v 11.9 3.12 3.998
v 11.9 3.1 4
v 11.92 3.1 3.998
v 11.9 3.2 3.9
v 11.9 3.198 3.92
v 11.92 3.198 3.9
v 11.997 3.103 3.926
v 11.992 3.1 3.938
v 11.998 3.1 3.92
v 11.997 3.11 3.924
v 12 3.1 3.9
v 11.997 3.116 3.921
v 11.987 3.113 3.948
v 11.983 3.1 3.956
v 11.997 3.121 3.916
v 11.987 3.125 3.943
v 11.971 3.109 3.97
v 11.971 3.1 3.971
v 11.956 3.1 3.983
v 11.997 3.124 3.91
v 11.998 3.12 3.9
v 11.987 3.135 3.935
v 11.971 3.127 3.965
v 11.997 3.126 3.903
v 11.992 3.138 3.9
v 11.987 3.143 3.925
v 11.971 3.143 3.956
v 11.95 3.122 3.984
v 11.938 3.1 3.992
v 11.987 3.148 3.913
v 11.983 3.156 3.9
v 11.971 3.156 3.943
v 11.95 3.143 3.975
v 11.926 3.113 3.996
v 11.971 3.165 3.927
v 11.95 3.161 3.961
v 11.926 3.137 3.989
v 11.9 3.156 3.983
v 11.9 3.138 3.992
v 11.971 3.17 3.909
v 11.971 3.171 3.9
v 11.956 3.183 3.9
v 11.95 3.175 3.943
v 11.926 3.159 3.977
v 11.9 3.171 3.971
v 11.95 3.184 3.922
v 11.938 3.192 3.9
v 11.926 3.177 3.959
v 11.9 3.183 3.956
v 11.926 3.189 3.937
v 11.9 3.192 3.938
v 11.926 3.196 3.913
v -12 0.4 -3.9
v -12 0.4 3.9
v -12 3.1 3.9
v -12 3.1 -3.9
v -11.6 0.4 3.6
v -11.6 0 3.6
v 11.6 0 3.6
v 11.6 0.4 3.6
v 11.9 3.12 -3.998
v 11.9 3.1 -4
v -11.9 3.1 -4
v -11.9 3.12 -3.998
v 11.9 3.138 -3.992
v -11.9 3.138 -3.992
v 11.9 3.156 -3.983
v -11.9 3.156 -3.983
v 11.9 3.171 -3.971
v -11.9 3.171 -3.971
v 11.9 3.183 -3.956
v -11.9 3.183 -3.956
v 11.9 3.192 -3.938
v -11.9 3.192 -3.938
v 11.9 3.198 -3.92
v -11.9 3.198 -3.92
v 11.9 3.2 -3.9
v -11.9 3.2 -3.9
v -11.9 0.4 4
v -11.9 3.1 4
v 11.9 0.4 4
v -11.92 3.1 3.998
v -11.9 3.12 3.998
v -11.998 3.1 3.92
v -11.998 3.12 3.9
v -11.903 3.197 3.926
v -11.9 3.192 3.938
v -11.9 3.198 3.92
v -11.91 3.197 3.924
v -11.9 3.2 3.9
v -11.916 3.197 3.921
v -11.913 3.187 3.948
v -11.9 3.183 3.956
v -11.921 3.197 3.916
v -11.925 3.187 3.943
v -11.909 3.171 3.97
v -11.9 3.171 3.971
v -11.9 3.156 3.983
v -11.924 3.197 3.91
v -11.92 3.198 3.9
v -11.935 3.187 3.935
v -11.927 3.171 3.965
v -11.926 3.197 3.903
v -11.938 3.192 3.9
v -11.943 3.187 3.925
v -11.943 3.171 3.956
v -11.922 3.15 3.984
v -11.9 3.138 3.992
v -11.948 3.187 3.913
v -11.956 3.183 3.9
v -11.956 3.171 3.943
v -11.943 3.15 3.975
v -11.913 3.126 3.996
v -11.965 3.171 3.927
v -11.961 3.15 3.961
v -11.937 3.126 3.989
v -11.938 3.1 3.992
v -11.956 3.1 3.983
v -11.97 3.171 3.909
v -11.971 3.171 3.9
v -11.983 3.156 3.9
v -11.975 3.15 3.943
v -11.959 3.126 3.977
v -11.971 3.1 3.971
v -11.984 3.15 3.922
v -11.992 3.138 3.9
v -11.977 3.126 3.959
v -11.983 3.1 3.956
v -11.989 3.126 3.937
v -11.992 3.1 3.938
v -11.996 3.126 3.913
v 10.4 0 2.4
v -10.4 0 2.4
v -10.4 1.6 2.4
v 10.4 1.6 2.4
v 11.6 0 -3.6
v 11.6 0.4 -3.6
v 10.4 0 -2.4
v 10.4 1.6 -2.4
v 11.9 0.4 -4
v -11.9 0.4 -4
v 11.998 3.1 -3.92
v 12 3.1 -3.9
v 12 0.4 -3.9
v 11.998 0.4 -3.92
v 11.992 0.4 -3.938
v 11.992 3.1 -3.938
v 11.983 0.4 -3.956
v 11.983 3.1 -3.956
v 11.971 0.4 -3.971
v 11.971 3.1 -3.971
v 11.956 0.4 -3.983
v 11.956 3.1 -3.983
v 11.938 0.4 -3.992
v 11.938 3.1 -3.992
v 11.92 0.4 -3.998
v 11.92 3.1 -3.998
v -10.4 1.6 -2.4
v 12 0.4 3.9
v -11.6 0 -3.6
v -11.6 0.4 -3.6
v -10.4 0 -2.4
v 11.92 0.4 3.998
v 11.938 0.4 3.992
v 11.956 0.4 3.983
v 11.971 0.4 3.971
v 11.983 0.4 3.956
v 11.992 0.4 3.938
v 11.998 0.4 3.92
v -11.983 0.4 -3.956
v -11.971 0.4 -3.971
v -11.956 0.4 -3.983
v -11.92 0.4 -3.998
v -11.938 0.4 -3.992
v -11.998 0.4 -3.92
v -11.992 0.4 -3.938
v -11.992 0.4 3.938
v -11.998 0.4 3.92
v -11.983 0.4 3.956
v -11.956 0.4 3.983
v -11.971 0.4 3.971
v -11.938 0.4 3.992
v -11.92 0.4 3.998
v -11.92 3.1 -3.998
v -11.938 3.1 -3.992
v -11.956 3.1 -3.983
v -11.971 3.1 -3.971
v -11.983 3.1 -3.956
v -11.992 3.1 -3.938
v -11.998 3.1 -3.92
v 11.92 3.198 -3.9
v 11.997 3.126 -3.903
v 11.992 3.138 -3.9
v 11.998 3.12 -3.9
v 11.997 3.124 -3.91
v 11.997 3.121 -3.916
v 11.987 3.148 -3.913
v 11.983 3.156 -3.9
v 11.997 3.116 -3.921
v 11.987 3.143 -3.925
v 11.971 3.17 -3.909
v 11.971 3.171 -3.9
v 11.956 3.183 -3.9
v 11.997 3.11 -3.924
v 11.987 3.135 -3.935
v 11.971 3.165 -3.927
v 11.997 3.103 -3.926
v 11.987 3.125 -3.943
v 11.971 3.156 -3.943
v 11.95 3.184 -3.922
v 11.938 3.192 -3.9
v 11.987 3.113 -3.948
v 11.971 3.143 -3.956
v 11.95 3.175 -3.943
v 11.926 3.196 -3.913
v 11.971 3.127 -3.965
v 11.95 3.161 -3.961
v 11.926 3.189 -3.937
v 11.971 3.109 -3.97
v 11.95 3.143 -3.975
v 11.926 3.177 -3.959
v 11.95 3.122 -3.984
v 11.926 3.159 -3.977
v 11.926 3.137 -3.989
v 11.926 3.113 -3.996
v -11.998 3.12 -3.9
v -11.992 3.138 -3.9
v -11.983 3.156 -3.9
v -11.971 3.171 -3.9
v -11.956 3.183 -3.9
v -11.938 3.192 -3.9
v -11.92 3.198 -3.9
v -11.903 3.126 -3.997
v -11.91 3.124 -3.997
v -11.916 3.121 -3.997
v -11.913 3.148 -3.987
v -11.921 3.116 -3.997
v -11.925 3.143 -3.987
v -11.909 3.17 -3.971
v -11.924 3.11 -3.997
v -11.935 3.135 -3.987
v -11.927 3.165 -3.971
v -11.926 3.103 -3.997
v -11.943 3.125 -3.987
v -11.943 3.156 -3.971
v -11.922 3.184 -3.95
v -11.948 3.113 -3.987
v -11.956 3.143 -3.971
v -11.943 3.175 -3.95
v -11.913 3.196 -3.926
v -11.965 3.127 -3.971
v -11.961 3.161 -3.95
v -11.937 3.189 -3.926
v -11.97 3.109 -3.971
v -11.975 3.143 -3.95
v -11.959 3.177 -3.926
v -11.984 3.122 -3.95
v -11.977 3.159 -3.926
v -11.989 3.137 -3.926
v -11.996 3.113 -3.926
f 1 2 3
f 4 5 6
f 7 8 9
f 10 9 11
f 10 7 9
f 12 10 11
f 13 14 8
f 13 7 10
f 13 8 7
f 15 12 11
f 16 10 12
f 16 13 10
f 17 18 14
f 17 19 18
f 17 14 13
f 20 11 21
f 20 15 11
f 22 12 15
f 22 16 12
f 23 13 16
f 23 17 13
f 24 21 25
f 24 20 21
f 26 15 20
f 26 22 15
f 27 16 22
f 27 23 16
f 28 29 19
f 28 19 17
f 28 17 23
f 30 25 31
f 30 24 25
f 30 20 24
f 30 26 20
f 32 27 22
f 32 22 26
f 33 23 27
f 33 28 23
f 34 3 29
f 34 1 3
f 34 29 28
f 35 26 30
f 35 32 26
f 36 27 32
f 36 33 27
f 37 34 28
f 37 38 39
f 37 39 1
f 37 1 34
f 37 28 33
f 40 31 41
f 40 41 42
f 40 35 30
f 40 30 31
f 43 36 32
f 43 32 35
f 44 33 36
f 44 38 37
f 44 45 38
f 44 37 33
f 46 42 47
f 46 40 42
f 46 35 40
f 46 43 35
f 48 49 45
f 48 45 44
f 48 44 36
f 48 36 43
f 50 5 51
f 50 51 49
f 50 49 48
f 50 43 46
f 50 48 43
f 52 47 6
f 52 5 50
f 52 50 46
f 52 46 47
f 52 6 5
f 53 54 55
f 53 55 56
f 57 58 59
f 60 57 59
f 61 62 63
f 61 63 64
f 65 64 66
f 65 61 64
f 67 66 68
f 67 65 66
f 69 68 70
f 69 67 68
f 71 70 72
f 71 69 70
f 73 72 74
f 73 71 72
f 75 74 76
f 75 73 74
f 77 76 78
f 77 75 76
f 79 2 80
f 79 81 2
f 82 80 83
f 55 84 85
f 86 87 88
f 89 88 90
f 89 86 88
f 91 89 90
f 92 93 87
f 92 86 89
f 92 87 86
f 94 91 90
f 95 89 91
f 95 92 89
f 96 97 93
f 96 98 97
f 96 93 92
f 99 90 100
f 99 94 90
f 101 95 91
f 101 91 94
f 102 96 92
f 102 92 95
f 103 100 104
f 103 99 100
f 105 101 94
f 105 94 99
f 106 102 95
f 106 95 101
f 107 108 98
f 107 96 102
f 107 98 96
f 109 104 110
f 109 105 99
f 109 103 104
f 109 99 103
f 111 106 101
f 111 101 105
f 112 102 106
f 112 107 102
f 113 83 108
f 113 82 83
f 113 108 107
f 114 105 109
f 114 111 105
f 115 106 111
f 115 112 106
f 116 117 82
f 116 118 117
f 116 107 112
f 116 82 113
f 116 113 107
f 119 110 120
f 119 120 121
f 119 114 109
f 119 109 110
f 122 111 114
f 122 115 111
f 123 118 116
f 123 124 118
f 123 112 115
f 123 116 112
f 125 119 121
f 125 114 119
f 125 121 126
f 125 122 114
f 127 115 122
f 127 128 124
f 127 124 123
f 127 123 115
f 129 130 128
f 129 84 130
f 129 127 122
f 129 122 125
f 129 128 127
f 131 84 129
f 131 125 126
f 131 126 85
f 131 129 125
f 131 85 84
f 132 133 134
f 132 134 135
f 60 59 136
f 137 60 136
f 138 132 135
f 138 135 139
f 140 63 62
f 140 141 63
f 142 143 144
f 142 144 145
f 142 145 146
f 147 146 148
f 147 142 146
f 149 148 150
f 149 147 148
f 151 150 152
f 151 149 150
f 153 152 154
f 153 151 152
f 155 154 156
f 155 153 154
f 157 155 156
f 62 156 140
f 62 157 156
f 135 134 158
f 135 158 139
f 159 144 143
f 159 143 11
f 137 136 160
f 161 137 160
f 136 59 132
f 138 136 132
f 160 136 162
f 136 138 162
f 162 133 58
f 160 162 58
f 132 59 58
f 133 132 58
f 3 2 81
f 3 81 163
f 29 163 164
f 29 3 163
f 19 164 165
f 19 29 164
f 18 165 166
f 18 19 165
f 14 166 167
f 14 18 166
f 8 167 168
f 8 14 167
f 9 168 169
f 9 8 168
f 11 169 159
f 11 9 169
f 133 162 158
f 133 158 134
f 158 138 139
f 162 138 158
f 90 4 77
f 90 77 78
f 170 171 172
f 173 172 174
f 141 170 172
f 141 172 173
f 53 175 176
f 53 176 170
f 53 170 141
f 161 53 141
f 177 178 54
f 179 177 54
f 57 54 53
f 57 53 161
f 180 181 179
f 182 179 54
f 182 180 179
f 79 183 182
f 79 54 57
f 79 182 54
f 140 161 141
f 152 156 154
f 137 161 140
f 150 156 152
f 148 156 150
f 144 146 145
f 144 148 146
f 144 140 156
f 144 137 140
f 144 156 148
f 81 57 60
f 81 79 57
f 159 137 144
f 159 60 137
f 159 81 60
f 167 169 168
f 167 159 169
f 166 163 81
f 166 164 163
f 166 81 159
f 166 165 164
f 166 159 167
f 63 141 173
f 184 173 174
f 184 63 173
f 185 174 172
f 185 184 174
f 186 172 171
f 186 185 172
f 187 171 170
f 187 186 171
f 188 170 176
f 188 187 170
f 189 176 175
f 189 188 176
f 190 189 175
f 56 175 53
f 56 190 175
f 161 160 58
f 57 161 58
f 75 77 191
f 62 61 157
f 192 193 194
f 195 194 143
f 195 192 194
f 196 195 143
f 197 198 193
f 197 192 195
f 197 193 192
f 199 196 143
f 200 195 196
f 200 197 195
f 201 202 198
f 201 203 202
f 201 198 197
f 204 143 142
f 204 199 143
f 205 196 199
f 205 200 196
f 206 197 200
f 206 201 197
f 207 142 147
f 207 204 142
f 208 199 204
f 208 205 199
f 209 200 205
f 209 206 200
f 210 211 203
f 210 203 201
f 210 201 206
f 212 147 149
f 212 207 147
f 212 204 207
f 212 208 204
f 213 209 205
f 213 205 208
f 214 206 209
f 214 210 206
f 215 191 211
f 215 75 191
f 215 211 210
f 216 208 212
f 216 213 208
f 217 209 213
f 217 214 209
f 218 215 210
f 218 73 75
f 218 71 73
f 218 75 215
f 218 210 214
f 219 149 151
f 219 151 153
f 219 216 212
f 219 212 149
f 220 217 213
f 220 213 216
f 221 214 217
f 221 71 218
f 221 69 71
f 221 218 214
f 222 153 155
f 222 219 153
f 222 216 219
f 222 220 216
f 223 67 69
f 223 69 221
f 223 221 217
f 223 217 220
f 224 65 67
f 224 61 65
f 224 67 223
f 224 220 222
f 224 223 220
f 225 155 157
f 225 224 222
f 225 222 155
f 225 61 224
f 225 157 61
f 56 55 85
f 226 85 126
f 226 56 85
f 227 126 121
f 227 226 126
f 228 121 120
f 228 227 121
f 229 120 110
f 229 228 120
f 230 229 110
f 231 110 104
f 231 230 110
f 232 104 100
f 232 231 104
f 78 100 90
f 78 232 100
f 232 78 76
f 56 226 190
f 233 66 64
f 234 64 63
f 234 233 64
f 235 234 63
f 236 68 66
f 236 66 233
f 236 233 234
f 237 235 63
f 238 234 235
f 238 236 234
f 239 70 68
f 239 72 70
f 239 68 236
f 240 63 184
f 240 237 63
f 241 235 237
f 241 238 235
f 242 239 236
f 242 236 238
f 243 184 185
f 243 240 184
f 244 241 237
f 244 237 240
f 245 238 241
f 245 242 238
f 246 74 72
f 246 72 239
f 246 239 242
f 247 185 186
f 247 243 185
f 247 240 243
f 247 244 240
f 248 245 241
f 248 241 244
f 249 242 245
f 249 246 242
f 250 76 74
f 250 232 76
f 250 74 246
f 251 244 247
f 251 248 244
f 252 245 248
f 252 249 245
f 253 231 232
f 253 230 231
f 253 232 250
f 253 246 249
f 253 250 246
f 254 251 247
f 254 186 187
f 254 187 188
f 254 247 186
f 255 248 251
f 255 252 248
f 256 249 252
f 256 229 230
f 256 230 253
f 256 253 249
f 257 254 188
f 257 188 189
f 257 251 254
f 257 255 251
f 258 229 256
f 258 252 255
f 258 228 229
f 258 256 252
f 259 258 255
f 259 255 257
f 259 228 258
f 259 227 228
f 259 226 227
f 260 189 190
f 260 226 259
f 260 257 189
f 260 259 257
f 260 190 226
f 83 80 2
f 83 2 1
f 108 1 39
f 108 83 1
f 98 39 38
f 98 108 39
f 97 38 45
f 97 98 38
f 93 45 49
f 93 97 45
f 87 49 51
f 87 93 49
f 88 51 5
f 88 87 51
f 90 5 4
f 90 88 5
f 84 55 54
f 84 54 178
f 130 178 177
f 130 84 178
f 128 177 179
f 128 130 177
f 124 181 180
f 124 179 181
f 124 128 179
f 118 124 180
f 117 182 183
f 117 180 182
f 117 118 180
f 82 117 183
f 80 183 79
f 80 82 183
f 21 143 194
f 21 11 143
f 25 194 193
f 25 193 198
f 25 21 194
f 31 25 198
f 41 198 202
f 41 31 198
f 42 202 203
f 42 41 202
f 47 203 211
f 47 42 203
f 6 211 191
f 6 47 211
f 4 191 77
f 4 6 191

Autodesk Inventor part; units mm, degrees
ref_plane "YZ Plane" through (0, 0, 0) normal (1, 0, 0) x (0, 1, 0)
ref_plane "XZ Plane" through (0, 0, 0) normal (0, 1, 0) x (-1, 0, 0)
ref_plane "XY Plane" through (0, 0, 0) normal (0, 0, 1) x (1, 0, 0)
sketch "Sketch2" plane through (0, 0, 0) normal (0, 1, 0) x (-1, 0, 0)
  line L0 (-12, 4) -> (12, 4)
  line L1 (12, 4) -> (12, -4)
  line L2 (12, -4) -> (-12, -4)
  line L3 (-12, -4) -> (-12, 4)
  point P0 (0, 0)
  point P1 (0, 4)
  point P2 (-12, 0)
  dimension "d0" = 24
  dimension "d1" = 8
extrude "Extrusion1" add sketch "Sketch2" along normal blind 3.2
sketch "Sketch3" plane through (0, 0, 0) normal (0, -1, 0) x (1, 0, 0)
  line L0 (12, 4) -> (-12, 4) projected
  line L1 (-12, 4) -> (-12, -4) projected
  line L2 (-10.4, 2.4) -> (10.4, 2.4)
  line L3 (10.4, 2.4) -> (10.4, -2.4)
  line L4 (10.4, -2.4) -> (-10.4, -2.4)
  line L5 (-10.4, -2.4) -> (-10.4, 2.4)
  circle A0 centre (-4, 4) radius 3.2569
  circle A1 centre (-4, 4) radius 2.4
  line L6 (-12, -4) -> (12, -4) projected
  circle A2 centre (-4, 0) radius 1.6
  line L7 (12, -4) -> (12, 4) projected
  line L8 (-8, 0) -> (0, 0) construction
  line L9 (0, 0) -> (8, 0) construction
  line L10 (-11.6, 3.6) -> (11.6, 3.6)
  line L11 (11.6, 3.6) -> (11.6, -3.6)
  line L12 (11.6, -3.6) -> (-11.6, -3.6)
  line L13 (-11.6, -3.6) -> (-11.6, 3.6)
  point P0 (-10.4, 0)
  point P1 (0, 2.4)
  point P2 (-4, 0)
  point P3 (0, 3.6)
  point P4 (-11.6, 0)
  dimension "d8" = 1.6
  dimension "d60" = 6.5137
  dimension "d61" = 4.8
  dimension "d62" = 1.6
  dimension "d75" = 8
  dimension "d76" = 8
  dimension "d86" = 3.2
  dimension "d89" = 8
  dimension "d95" = 0.4
  dimension "d96" = 0.4
extrude "Extrusion2" cut sketch "Sketch3" against normal blind 1.6 contours A0 A2 A1 L2 | L2 L3 L4 L5 A0 A2 | A1 L2 | L2 A1 A2 A0 | A2 A0 | A0 A2
extrude "Extrusion7" cut sketch "Sketch3" against normal blind 0.4 contours L7 L6 L1 L0 A0 L10 L13 L12 L11 | A0 L10 A1 L0 | A1 L10 L0 | L0 A1 L10 A0
fillet "Fillet1" radius 0.1 8 edges at (-12, 1.8, 4) (0, 3.2, 4) (-12, 3.2, 0) (0, 3.2, -4) (12, 3.2, 0) (12, 1.8, 4) (12, 1.8, -4) (-12, 1.8, -4)
sketch "Skizze10" plane through (0, 3.2, 0) normal (0, 1, 0) x (1, 0, 0)
  line L0 (-11.9, -3.9) -> (-11.9, 3.9) projected
  line L1 (-11.9, -3.9419) -> (-11.9, 3.9419) construction
  line L2 (-11.9, 3.9419) -> (11.9, 3.9419) construction
  line L3 (11.9, 3.9419) -> (11.9, -3.9419) construction
  line L4 (11.9, -3.9419) -> (-11.9, -3.9419) construction
  point P0 (0, 0)
  point P1 (0, 3.9419)
  point P2 (-11.9, 0)
  point P3 (-11.9, 0)
decal "Aufkleber1"
equation "\"d4\" = 0.333333 * lh"
equation "\"d8\" = d62"
equation "\"d60\" = tubeod"
equation "\"d61\" = kd"
equation "\"d62\" = wall"
equation "\"d75\" = lu"
equation "\"d76\" = d75"
equation "\"d86\" = pd"
equation "\"d89\" = lu"
equation "\"d95\" = gw"
equation "\"d96\" = gw"
equation "\"d11\" = 0.333333 * lh - topthk"
equation "\"d97\" = gh"
equation "\"lh\" = 9.6"
equation "\"tubeod\" = 6.513708"
equation "\"kd\" = 4.8"
equation "\"wall\" = 1.6"
equation "\"lu\" = 8"
equation "\"pd\" = 3.2"
equation "\"gw\" = 0.4"
equation "\"topthk\" = 1.6"
equation "\"gh\" = 0.4"
properties part number "42146_63864_1" material "ABS Plastic"
